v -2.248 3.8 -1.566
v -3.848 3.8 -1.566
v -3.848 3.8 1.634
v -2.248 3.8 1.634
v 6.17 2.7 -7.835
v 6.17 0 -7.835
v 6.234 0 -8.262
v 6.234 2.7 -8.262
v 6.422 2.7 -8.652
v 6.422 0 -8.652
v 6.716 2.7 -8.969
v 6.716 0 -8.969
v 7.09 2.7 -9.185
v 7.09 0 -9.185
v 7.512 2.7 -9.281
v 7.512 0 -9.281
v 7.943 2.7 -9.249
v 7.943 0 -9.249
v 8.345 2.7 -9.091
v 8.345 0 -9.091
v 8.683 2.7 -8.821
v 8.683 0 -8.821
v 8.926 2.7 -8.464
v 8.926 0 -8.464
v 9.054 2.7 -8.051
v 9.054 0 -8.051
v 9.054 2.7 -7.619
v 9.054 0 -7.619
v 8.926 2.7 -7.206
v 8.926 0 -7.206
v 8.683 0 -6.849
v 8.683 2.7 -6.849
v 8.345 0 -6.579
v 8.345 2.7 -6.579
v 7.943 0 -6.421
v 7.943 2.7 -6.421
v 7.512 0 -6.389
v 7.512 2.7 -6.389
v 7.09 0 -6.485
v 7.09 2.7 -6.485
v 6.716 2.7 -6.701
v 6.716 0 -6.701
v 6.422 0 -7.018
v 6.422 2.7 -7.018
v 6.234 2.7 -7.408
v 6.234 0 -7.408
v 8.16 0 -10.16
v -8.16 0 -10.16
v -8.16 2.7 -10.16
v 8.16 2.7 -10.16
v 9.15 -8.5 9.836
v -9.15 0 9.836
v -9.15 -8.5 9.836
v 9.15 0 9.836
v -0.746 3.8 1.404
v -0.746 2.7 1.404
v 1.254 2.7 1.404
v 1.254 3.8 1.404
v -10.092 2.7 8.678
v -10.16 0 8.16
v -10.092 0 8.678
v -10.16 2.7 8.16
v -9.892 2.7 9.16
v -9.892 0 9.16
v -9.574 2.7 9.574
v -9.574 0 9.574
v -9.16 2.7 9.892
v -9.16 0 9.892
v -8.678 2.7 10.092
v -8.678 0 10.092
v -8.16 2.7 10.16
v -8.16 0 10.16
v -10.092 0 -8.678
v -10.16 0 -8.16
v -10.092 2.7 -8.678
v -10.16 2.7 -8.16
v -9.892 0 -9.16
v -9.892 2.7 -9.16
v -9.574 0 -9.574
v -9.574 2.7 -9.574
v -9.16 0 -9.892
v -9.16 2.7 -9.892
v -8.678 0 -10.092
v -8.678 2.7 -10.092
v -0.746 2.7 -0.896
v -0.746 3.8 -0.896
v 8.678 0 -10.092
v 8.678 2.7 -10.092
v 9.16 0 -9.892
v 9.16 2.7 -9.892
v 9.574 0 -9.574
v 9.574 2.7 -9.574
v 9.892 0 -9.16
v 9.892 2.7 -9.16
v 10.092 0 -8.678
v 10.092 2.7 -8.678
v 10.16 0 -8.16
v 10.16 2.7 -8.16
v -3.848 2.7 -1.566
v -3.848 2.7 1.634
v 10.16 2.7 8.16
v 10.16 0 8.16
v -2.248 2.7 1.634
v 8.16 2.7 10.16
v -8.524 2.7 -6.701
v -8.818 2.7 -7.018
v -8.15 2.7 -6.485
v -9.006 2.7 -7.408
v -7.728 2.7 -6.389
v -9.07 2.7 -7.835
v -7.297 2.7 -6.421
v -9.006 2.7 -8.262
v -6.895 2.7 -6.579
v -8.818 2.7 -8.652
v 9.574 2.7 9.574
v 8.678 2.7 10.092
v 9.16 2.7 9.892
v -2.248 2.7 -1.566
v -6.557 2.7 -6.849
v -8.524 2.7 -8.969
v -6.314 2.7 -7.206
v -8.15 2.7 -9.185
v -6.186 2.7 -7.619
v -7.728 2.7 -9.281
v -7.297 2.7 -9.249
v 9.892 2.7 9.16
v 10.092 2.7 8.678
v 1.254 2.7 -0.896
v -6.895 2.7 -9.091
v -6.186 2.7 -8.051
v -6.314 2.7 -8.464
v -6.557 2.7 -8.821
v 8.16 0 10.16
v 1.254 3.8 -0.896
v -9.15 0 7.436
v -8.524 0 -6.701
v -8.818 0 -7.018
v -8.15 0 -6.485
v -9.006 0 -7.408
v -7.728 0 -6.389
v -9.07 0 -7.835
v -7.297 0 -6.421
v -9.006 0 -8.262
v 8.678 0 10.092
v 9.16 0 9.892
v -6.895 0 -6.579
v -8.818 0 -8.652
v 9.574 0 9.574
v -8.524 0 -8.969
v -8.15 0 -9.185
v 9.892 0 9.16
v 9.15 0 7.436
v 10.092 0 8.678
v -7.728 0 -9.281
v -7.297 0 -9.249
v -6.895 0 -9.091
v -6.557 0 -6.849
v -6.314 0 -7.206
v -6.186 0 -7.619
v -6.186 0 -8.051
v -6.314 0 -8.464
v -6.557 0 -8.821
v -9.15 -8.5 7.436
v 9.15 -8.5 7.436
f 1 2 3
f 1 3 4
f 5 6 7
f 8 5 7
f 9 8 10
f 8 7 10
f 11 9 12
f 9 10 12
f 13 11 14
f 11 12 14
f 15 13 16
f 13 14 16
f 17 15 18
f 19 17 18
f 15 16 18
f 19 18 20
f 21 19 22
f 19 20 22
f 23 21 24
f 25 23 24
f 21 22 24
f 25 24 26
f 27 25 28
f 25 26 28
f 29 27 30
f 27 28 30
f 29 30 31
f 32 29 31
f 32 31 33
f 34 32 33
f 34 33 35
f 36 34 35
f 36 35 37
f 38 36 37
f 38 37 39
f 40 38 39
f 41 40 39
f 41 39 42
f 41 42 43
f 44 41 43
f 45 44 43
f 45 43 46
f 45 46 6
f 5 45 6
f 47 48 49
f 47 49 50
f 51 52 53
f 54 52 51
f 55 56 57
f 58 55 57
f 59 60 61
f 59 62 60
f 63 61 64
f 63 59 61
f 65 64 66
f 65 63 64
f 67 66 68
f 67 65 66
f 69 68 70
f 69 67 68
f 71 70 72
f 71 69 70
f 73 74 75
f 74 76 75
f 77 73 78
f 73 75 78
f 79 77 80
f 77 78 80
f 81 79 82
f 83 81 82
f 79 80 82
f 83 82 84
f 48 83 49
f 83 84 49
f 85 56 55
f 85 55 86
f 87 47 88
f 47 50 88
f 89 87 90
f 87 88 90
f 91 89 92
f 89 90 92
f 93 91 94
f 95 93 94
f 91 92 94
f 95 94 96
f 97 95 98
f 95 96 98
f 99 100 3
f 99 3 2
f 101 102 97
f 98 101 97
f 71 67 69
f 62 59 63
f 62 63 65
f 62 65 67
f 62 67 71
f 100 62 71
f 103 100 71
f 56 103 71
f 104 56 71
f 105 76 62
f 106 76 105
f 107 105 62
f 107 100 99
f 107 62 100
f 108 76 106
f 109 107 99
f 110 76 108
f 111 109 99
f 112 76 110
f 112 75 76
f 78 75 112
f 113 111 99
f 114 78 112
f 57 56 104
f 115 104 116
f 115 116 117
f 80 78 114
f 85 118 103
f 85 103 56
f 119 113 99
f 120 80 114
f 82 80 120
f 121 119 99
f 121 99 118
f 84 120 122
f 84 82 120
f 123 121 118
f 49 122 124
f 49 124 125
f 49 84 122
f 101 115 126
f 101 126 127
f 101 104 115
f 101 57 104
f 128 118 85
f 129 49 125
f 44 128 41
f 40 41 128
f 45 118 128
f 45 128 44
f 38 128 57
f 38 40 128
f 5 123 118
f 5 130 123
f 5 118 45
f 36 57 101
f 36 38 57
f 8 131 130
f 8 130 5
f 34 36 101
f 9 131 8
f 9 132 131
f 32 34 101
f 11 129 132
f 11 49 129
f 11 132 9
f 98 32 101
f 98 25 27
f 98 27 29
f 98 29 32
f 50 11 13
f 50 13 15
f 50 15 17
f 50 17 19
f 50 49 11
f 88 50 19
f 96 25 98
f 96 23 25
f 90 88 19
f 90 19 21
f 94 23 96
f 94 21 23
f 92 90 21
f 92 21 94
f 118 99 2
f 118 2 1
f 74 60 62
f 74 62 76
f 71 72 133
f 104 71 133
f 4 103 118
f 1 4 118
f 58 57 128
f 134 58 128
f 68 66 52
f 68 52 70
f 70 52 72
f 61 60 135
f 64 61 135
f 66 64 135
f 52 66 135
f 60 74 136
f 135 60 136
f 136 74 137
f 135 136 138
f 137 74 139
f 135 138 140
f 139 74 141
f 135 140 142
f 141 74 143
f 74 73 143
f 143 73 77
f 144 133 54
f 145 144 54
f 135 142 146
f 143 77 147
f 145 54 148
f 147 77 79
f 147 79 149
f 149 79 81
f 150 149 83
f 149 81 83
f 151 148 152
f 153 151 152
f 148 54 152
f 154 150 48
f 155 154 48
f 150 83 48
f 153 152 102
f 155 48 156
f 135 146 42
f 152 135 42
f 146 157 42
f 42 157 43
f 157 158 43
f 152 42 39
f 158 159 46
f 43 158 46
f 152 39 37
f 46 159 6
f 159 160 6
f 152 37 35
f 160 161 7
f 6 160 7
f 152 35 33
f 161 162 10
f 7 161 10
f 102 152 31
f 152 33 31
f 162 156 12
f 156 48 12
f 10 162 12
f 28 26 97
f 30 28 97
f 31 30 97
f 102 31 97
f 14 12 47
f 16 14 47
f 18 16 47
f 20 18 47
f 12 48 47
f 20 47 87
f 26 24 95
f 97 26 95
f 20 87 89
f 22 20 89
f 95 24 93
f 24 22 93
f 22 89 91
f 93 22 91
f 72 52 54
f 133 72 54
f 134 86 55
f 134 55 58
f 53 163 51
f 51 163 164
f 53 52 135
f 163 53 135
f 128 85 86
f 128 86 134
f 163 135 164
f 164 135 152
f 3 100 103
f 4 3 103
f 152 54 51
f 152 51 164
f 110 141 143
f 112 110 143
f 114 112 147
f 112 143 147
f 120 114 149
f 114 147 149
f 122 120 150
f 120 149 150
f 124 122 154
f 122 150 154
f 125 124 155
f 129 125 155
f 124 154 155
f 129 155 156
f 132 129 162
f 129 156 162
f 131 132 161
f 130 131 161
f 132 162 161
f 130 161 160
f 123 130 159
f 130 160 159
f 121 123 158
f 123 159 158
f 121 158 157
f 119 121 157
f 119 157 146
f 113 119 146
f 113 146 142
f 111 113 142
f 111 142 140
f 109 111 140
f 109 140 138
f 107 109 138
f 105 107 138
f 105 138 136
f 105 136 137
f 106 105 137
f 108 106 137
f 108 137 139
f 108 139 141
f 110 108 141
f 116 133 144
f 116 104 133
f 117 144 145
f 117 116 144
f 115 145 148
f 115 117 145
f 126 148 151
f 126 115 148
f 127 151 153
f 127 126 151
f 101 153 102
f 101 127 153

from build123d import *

# Parameters (mm, degrees)
ESQUISSE1_W        = 20.32
ESQUISSE1_H        = 20.32
BOSS_EXTRU_1_DEPTH = 2.7
D_GAGEMENT_M2_51_D = 2.9
ESQUISSE7_W        = 2
ESQUISSE7_H        = 2.3
ESQUISSE7_W_2      = 1.6
ESQUISSE7_H_2      = 3.2
BOSS_EXTRU_3_DEPTH = 1.1
ESQUISSE3_W        = 18.3
ESQUISSE3_H        = 2.4
BOSS_EXTRU_2_DEPTH = 8.5
CONG_1_R           = 2


with BuildPart() as part:
    # Esquisse1 → Boss.-Extru.1 (new body)
    with BuildSketch(Plane(origin=(0, 0, 0), x_dir=(1, 0, 0), z_dir=(0, 1, 0))):
        Rectangle(ESQUISSE1_W, ESQUISSE1_H)
    extrude(amount=BOSS_EXTRU_1_DEPTH)

    # Dégagement M2.51 (through all)
    with Locations(Plane(origin=(0, 2.7, 0), x_dir=(1, 0, 0), z_dir=(0, 1, 0))):
        with Locations((-7.62, 7.835000674), (7.62, 7.835000674)):
            Hole(D_GAGEMENT_M2_51_D / 2)

    # Esquisse7 → Boss.-Extru.3 (add)
    with BuildSketch(Plane(origin=(0, 2.7, 0), x_dir=(1, 0, 0), z_dir=(0, 1, 0))):
        with Locations((0.254, -0.254)):
            Rectangle(ESQUISSE7_W, ESQUISSE7_H)
        with Locations((-3.048, -0.034)):
            Rectangle(ESQUISSE7_W_2, ESQUISSE7_H_2)
    extrude(amount=BOSS_EXTRU_3_DEPTH)

    # Esquisse3 → Boss.-Extru.2 (add)
    with BuildSketch(Plane(origin=(0, 0, 0), x_dir=(1, 0, 0), z_dir=(0, 1, 0))):
        with Locations((0, -8.636)):
            Rectangle(ESQUISSE3_W, ESQUISSE3_H)
    extrude(amount=-BOSS_EXTRU_2_DEPTH)

    # Congé1
    cong_1_edges = [part.edges().sort_by_distance(p)[0] for p in [
        (-10.16, 1.35, -10.16),
        (10.16, 1.35, -10.16),
        (10.16, 1.35, 10.16),
        (-10.16, 1.35, 10.16),
    ]]
    fillet(cong_1_edges, radius=CONG_1_R)


solid = part.part
